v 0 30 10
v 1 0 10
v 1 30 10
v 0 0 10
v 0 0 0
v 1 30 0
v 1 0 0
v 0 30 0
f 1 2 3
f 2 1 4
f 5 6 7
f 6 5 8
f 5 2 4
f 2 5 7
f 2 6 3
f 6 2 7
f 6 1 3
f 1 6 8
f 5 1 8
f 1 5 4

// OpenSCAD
$fs=0.8; // def 1, 0.2 is high res
$fa=4;//def 12, 3 is very nice
%translate([0,0,-0.5])cube([200,200,1],center=true); //build platform

h1 = 10;
h2 = 5;

cube([1,30,h1]);
